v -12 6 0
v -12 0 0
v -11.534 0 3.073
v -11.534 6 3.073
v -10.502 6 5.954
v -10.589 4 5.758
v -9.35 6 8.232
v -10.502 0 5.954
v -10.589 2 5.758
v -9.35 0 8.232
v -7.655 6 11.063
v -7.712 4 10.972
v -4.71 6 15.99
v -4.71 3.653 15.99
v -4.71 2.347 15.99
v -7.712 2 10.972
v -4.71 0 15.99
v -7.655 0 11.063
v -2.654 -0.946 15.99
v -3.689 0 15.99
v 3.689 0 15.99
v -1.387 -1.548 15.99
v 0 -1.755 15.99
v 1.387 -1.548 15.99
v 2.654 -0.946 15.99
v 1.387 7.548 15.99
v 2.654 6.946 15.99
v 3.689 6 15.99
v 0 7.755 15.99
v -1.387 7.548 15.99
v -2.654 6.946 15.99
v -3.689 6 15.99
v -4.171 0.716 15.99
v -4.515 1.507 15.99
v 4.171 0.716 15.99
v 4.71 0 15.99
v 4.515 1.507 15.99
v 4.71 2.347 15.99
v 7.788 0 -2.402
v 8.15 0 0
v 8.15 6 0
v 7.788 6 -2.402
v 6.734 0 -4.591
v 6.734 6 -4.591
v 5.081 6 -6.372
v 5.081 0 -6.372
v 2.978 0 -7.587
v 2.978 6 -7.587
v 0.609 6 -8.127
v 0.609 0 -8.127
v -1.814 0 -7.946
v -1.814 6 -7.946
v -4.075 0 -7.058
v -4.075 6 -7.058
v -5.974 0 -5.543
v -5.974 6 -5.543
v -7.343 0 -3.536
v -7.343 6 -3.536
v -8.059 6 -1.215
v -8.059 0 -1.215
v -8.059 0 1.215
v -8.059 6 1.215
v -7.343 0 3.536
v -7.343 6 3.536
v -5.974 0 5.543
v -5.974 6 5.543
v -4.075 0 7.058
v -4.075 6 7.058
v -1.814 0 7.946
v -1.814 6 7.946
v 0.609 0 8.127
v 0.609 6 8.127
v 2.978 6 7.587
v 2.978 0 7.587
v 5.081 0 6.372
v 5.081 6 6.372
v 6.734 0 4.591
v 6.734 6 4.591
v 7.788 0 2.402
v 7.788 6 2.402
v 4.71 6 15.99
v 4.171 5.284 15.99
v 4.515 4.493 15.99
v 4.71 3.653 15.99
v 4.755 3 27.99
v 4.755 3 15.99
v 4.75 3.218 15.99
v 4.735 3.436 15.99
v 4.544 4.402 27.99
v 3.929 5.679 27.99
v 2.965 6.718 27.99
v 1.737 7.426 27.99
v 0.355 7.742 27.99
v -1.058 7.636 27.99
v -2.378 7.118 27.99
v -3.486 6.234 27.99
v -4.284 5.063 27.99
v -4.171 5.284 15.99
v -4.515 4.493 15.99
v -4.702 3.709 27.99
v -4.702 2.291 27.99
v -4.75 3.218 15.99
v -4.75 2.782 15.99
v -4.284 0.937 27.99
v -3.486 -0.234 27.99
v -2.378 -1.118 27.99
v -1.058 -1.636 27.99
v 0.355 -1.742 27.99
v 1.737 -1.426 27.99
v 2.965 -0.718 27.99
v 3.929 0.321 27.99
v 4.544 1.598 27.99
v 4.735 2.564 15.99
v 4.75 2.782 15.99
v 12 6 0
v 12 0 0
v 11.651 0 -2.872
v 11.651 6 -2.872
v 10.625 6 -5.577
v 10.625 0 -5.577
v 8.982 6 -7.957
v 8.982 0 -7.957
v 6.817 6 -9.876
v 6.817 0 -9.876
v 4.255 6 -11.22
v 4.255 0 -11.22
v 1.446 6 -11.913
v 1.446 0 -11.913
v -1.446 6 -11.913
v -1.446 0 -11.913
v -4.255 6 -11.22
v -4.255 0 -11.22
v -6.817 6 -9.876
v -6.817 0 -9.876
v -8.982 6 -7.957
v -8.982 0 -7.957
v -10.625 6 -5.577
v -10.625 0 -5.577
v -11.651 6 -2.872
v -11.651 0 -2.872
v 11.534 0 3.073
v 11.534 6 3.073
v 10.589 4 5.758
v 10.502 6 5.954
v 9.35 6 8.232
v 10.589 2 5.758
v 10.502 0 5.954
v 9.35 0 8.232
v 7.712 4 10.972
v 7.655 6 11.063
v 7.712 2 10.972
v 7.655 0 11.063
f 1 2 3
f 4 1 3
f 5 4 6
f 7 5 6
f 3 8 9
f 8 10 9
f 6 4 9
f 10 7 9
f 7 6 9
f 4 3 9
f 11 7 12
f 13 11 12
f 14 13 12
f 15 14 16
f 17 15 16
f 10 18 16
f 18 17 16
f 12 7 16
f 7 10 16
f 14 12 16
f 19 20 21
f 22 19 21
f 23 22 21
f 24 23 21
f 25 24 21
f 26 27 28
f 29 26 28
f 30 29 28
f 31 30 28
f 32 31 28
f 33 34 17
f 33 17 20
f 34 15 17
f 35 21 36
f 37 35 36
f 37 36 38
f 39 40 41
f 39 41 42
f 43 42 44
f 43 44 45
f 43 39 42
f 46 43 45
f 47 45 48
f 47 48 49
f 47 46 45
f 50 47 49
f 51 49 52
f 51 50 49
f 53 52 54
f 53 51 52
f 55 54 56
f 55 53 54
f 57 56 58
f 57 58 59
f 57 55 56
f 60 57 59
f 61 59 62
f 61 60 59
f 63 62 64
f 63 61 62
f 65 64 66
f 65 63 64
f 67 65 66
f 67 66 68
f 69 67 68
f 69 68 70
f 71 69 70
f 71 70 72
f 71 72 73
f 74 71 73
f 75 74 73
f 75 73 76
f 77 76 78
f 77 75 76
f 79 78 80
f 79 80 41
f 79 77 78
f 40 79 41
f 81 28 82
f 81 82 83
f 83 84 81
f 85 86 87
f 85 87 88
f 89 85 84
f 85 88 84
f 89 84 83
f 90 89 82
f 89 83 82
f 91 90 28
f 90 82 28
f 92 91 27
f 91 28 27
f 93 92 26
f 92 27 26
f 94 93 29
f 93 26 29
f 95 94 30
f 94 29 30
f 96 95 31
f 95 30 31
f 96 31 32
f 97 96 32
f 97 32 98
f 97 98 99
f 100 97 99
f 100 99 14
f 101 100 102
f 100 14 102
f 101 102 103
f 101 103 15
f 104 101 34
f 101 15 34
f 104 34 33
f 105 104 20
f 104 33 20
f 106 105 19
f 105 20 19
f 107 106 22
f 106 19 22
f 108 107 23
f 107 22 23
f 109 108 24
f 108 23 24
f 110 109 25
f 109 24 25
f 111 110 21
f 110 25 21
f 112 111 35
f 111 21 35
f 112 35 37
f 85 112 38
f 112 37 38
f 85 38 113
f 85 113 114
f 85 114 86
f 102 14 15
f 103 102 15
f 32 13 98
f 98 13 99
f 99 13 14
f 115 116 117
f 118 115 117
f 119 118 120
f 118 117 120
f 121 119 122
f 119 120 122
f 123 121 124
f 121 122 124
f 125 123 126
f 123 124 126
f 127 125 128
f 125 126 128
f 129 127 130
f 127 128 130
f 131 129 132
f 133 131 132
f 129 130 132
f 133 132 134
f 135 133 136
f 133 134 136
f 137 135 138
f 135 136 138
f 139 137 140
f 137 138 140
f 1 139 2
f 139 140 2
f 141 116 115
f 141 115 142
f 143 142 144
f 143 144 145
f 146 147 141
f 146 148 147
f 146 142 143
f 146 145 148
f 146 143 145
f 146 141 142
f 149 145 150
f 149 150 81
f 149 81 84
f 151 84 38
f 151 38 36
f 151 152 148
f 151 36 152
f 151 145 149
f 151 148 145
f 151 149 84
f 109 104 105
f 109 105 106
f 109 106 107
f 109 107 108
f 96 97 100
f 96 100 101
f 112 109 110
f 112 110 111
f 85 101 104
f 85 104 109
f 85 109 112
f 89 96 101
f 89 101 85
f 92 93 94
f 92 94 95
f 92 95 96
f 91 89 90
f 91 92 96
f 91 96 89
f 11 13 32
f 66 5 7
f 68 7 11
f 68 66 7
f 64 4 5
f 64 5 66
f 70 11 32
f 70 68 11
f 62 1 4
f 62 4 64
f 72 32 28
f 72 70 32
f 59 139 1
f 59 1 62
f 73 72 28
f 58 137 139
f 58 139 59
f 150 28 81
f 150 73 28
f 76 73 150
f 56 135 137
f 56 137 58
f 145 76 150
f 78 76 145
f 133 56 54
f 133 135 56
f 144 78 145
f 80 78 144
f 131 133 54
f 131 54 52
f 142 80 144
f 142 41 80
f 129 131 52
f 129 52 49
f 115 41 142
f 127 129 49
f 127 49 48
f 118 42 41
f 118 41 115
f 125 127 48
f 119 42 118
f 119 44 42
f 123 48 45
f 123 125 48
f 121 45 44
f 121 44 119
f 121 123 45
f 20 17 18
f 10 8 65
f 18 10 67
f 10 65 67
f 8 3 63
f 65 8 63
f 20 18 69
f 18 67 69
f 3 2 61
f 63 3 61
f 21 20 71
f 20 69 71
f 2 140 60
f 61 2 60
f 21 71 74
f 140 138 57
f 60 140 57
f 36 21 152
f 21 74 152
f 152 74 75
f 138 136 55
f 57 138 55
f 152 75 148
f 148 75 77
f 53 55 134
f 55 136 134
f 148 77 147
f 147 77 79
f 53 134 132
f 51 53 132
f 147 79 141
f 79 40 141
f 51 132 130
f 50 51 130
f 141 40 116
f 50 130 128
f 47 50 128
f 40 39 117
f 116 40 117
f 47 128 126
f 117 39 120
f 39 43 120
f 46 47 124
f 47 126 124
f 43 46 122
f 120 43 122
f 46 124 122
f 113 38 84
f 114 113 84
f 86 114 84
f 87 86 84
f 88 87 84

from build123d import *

# Parameters (mm, degrees)
SKETCH2_R           = 8.15
BOSS_EXTRUDE1_DEPTH = 6
SKETCH3_R           = 4.755
BOSS_EXTRUDE2_DEPTH = 12


with BuildPart() as part:
    # Sketch2 → Boss-Extrude1 (new body)
    with BuildSketch(Plane(origin=(0, 0, 0), x_dir=(1, 0, 0), z_dir=(0, 1, 0))):
        with BuildLine():
            Line((-4.71, -15.99), (4.71, -15.99))
            add(Edge.make_bspline(
                [(12, 0), (11.768004517, -6.147027332), (7.327289648, -10.952825214), (4.71, -15.99)],
                knots=[0, 0, 0, 0, 0.424868327, 0.424868327, 0.424868327, 0.424868327], degree=3))
            ThreePointArc((12, 0), (0, 12), (-12, 0))
            add(Edge.make_bspline(
                [(-12, 0), (-11.768004517, -6.147027332), (-7.327289648, -10.952825214), (-4.71, -15.99)],
                knots=[0, 0, 0, 0, 0.424868327, 0.424868327, 0.424868327, 0.424868327], degree=3))
        make_face()
        Circle(SKETCH2_R, mode=Mode.SUBTRACT)
    extrude(amount=BOSS_EXTRUDE1_DEPTH)

    # Sketch3 → Boss-Extrude2 (add)
    with BuildSketch(Plane.XY.offset(15.99)):
        with Locations((0, 3)):
            Circle(SKETCH3_R)
    extrude(amount=BOSS_EXTRUDE2_DEPTH)


solid = part.part
